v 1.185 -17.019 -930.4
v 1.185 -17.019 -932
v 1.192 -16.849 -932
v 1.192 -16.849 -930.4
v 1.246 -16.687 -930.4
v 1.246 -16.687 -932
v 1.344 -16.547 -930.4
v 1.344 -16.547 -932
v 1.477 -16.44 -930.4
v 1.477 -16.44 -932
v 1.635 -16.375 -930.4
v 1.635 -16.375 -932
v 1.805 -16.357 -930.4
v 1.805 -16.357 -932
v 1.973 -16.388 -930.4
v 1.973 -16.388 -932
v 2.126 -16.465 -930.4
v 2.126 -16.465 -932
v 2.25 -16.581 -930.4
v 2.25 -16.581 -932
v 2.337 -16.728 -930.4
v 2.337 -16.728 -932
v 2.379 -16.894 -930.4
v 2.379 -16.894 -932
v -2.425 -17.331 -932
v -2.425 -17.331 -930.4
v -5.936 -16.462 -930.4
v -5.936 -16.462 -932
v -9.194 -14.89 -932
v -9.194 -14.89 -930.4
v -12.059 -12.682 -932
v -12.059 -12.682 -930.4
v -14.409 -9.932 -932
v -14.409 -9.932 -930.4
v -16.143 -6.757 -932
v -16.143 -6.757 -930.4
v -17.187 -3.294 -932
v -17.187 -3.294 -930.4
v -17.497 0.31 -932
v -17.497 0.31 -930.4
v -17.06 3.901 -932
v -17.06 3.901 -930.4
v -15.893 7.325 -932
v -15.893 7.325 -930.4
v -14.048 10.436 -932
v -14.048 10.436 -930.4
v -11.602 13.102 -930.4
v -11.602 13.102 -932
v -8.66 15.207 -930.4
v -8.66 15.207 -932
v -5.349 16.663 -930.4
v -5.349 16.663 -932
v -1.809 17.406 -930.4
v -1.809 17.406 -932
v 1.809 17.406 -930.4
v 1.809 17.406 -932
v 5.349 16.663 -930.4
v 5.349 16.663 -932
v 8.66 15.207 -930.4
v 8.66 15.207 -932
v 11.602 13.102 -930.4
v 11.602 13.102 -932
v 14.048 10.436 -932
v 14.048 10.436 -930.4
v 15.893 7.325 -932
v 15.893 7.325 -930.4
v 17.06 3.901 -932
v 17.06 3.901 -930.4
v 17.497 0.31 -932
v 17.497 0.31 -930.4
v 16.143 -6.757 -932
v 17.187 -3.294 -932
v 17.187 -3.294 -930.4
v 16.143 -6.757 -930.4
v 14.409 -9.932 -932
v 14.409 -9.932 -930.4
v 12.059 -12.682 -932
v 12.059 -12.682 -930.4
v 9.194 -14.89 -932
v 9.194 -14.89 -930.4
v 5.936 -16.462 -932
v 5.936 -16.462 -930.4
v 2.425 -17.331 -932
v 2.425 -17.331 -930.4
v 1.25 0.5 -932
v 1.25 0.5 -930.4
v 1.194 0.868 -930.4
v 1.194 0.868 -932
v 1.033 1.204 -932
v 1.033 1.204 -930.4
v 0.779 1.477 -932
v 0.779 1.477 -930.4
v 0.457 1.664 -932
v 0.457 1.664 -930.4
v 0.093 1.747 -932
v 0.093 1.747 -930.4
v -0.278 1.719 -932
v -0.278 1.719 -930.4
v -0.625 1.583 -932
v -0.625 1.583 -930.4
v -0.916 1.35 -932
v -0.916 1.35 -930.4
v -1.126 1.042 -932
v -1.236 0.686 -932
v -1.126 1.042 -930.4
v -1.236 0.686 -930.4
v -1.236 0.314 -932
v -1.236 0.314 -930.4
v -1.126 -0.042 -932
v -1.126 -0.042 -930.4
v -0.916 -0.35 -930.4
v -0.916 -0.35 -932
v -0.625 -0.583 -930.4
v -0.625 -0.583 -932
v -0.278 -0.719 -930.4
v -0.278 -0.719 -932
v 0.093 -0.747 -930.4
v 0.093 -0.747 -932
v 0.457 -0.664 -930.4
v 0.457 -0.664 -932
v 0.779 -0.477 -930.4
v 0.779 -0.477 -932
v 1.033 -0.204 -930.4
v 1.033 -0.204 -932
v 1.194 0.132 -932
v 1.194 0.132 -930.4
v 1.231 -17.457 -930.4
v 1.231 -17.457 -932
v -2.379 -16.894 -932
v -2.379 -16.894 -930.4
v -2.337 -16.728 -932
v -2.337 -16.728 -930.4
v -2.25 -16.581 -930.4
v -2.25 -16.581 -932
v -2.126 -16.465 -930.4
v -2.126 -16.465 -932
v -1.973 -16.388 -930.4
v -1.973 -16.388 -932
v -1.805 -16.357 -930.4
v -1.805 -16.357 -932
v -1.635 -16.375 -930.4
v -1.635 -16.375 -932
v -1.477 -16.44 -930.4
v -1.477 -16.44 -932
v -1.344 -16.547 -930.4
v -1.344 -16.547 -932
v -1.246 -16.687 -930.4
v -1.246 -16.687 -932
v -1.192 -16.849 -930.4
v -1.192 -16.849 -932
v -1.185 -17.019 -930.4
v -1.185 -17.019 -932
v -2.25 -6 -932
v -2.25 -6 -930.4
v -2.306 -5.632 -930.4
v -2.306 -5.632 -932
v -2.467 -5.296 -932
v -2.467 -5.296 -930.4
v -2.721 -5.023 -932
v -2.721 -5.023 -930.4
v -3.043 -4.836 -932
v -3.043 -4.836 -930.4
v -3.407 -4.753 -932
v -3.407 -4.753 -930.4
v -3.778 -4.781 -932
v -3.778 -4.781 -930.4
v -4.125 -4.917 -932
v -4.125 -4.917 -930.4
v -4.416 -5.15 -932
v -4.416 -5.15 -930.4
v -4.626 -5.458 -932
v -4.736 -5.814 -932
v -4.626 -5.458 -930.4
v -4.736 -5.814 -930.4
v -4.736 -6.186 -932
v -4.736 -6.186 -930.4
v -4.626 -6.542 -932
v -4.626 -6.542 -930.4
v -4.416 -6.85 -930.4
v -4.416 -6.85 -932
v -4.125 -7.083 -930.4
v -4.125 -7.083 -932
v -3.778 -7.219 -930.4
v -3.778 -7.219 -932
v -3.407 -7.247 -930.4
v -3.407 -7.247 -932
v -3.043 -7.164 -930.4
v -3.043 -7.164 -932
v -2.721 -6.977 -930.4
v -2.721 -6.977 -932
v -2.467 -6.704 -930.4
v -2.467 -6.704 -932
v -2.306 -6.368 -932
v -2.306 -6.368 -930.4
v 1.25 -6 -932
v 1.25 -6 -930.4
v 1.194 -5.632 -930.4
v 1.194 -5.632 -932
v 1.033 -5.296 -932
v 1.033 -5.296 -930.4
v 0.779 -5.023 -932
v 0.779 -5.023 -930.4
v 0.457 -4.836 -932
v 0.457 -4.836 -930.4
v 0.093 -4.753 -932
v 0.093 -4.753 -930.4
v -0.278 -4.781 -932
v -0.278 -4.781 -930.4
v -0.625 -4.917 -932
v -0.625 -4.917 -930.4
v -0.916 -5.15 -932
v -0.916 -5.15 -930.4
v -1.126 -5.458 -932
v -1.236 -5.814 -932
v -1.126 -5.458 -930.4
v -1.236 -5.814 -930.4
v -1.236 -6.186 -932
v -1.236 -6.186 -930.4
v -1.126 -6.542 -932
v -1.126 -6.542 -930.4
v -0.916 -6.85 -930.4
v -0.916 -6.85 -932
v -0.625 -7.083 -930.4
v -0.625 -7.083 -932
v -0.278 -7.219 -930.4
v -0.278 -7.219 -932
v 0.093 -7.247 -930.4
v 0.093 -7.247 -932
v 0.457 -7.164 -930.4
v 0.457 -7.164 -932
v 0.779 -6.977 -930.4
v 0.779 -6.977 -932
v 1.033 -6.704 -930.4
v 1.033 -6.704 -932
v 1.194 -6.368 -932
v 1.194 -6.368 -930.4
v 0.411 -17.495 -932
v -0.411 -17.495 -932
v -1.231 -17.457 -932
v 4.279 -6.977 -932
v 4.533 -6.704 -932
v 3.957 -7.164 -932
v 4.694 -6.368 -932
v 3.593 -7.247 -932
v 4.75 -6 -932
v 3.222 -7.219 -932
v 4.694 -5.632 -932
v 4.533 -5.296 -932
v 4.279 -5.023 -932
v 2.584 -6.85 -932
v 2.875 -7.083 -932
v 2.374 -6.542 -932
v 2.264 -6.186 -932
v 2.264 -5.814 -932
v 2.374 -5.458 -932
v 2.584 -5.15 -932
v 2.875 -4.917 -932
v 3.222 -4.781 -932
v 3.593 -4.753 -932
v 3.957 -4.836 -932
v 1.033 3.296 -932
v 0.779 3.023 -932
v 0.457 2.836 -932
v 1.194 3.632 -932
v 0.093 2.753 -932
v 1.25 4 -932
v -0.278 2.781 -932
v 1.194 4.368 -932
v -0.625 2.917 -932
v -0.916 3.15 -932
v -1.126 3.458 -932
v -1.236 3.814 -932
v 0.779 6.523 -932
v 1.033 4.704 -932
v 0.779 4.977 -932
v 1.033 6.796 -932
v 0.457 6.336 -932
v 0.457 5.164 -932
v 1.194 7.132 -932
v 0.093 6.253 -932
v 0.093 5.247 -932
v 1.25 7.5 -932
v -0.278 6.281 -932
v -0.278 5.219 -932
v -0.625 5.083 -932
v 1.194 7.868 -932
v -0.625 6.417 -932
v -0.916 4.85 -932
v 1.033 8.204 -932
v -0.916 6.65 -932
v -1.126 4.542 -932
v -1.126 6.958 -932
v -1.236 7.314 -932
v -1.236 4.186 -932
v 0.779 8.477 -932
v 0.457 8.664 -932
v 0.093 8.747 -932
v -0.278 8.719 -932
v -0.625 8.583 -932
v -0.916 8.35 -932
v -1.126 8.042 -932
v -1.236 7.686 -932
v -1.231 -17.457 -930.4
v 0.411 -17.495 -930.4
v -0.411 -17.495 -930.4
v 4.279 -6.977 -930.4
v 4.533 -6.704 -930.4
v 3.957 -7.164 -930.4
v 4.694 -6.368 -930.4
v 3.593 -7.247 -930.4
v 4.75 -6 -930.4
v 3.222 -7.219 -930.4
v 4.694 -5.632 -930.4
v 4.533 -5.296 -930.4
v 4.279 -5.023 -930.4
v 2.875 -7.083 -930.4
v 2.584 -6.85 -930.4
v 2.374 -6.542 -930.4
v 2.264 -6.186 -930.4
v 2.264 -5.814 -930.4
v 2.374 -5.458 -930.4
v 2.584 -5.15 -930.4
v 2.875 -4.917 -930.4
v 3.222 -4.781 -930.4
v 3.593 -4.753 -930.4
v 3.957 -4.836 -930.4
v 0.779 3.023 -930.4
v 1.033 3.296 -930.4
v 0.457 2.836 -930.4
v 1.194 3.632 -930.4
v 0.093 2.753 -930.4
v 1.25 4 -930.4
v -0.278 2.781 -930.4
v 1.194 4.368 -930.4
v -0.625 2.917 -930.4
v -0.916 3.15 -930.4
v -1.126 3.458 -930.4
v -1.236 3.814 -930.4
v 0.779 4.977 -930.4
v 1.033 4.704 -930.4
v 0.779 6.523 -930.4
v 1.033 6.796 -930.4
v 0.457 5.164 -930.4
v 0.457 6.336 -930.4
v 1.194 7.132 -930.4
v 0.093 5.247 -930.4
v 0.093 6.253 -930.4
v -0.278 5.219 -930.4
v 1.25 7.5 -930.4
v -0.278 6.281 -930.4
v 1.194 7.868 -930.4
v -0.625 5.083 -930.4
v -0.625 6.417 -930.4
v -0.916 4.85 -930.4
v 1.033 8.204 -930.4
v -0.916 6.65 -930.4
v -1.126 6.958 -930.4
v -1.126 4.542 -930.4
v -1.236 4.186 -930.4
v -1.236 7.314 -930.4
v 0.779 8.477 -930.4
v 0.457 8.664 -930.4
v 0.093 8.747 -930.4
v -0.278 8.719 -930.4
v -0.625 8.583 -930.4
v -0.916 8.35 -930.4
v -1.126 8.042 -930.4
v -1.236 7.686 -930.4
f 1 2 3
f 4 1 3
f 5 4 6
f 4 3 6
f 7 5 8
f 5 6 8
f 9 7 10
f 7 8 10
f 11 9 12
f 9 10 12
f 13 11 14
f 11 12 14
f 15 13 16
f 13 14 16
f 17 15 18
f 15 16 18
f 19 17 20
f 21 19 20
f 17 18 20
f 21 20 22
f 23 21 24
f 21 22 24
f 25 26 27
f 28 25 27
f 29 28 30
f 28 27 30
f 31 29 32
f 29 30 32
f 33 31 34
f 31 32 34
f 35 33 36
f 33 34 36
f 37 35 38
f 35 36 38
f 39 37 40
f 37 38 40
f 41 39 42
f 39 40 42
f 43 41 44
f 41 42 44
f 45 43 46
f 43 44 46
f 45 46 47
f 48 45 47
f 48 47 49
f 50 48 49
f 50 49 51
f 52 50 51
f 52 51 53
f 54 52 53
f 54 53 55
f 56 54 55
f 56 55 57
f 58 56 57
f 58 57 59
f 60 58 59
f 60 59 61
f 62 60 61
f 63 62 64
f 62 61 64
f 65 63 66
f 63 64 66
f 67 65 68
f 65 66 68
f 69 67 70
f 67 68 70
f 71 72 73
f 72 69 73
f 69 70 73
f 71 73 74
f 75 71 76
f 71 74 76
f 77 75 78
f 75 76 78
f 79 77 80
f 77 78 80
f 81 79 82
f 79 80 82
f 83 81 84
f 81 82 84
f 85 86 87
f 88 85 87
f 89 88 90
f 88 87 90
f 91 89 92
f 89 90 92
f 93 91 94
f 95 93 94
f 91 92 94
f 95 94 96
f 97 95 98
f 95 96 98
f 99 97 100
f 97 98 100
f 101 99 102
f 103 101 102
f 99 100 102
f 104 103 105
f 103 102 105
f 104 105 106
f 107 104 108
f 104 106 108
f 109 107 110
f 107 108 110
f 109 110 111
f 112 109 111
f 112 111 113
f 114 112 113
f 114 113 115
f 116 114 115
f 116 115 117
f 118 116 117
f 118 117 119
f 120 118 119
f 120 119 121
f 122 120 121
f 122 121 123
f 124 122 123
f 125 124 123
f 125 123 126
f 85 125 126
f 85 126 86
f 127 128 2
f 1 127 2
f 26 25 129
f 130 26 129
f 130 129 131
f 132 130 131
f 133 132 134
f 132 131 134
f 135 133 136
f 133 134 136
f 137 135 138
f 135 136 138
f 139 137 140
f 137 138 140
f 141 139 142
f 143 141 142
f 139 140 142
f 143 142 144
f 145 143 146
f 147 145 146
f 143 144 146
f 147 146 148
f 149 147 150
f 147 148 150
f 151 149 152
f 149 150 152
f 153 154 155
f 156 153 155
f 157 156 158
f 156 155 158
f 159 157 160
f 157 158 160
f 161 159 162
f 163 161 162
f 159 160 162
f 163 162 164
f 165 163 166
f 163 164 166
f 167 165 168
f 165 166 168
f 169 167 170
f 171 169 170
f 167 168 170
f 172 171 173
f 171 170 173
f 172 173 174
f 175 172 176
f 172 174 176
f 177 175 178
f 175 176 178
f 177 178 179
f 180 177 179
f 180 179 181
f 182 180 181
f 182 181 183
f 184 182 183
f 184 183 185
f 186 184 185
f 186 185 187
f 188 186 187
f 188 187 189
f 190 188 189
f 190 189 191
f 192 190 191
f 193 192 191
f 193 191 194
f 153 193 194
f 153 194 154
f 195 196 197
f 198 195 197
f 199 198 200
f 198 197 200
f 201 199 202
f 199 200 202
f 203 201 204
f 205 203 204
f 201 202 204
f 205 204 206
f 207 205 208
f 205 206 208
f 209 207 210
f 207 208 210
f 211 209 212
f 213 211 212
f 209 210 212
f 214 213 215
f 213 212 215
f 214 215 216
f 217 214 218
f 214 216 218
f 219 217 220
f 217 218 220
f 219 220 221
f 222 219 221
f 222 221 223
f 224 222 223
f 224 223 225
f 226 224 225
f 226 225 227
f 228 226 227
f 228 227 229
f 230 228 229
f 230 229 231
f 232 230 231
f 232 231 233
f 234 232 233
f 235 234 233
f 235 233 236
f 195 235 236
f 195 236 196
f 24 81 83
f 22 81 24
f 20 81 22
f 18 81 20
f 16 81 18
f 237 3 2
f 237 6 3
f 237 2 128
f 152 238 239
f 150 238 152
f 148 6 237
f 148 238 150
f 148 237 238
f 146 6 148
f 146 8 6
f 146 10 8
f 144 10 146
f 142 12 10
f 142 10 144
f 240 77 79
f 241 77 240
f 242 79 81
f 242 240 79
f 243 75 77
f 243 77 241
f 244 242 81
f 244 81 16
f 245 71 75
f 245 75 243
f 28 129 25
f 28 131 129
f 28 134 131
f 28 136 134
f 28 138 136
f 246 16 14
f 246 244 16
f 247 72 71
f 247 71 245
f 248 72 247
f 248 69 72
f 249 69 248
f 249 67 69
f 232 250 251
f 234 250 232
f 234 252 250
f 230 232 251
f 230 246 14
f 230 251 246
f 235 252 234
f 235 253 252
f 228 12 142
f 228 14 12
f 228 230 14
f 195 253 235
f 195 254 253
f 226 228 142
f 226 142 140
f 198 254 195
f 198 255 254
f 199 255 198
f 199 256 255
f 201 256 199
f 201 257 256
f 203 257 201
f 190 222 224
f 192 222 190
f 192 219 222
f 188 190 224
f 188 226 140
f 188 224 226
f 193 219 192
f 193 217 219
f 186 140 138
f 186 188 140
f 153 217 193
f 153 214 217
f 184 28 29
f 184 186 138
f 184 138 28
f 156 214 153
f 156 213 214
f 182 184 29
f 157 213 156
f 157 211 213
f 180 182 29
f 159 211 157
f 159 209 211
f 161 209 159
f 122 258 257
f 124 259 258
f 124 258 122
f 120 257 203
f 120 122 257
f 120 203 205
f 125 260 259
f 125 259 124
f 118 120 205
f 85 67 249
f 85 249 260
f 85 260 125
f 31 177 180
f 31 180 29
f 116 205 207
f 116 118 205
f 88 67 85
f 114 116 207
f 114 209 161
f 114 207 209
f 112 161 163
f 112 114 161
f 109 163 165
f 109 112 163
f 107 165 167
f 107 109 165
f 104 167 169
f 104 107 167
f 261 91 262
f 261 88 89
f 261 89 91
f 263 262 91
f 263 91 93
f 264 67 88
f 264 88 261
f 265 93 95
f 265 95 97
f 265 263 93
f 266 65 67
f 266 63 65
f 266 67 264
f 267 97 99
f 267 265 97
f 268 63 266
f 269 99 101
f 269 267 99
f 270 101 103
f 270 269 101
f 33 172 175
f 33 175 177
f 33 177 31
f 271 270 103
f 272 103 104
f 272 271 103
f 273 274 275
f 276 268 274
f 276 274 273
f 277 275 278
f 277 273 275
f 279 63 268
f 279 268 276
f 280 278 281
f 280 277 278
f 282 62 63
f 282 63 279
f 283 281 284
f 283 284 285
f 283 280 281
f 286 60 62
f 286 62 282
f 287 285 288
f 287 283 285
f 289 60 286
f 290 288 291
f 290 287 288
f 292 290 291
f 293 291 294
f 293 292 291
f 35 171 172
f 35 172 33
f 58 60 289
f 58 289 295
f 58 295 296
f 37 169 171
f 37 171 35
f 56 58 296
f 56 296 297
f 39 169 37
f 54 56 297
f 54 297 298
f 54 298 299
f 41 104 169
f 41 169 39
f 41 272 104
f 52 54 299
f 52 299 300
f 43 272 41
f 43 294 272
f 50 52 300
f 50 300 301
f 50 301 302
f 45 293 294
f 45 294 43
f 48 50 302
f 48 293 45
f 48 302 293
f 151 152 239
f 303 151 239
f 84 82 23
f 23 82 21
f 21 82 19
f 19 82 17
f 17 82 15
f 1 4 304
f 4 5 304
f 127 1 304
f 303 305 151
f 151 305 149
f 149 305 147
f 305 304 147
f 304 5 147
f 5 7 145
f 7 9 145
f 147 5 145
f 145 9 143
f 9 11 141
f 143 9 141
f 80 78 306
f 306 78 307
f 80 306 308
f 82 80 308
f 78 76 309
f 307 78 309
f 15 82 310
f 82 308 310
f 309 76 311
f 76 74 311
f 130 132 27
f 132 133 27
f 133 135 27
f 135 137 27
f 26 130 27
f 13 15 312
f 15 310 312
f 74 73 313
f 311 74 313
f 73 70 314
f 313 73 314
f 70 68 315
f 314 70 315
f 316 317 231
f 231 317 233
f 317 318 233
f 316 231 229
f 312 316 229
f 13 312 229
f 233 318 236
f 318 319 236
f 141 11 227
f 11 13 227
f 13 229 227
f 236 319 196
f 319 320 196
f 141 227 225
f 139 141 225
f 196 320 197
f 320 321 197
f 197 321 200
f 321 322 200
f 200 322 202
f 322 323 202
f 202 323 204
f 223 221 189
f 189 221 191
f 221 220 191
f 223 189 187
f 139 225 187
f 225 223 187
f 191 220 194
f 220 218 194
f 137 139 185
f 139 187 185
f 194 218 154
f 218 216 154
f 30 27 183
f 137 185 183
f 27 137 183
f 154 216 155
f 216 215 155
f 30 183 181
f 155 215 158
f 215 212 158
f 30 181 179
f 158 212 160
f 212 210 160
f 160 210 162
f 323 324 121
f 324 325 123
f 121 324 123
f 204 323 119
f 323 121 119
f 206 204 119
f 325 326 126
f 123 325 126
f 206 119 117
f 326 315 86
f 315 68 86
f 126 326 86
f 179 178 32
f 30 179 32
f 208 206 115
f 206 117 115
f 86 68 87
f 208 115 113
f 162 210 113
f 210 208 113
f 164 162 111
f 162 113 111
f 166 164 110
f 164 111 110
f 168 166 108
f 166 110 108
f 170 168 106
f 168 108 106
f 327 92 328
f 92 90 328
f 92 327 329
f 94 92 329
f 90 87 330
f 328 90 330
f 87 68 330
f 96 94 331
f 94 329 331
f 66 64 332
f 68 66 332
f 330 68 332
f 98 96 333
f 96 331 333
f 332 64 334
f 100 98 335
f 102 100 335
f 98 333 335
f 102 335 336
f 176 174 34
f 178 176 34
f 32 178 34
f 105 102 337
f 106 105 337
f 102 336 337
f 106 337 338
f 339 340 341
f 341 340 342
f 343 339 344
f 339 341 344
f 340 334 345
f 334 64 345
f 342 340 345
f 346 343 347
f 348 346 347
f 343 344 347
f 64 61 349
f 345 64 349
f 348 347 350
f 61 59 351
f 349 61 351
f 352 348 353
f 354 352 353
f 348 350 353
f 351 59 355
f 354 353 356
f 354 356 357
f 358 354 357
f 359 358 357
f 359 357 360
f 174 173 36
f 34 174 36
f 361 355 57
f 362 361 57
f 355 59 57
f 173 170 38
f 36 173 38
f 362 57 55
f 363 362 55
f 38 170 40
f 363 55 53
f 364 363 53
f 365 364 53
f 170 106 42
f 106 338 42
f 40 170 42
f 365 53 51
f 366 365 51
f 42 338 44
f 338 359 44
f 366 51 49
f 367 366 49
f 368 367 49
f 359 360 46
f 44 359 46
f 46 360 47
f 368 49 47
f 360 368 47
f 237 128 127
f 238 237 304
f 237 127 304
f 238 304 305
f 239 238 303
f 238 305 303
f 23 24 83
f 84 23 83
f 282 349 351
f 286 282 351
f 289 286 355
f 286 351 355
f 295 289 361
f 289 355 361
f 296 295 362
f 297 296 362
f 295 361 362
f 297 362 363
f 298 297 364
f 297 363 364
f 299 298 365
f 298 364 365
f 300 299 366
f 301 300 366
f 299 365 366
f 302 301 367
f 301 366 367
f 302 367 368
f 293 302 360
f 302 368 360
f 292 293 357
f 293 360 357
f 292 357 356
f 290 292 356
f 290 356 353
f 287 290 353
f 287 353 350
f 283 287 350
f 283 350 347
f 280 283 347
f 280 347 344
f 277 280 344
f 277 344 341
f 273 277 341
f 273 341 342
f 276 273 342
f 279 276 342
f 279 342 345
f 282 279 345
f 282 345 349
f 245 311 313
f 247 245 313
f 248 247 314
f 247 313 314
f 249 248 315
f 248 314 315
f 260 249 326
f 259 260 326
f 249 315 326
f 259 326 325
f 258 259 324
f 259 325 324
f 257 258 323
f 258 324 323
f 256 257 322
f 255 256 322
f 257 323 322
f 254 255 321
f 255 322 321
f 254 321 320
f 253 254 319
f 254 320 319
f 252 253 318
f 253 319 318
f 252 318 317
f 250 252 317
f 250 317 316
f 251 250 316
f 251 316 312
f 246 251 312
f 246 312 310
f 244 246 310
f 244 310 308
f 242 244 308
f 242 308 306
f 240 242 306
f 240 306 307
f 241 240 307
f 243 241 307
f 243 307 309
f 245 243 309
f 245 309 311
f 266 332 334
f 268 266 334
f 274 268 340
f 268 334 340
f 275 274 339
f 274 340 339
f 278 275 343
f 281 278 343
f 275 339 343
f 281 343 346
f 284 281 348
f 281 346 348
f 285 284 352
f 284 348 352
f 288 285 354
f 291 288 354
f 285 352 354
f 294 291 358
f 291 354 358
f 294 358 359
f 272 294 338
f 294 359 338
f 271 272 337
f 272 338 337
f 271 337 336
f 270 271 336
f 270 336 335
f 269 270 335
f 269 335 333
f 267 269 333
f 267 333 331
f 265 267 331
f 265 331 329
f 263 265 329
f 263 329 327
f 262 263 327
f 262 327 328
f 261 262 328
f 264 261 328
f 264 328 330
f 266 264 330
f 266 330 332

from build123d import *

# Parameters (mm, degrees)
SKETCH1_R           = 17.5
BOSS_EXTRUDE1_DEPTH = 1.6
CUT_EXTRUDE1_DEPTH  = 25.800403223
SKETCH4_R           = 1.25
CUT_EXTRUDE2_DEPTH  = 25.800403223


with BuildPart() as part:
    # Sketch1 → Boss-Extrude1 (new body)
    with BuildSketch(Plane(origin=(0, 0, -930.4), x_dir=(-1, 0, 0), z_dir=(0, 0, -1))):
        Circle(SKETCH1_R)
    extrude(amount=BOSS_EXTRUDE1_DEPTH)

    # Sketch2 → Cut-Extrude1 (cut, through all)
    with BuildSketch(Plane(origin=(0, 0, -932), x_dir=(-1, 0, 0), z_dir=(0, 0, -1))):
        with BuildLine():
            Line((-2.378923436, -16.893881238), (-2.424885778, -17.331183715))
            ThreePointArc((-2.424885778, -17.331183715), (-1.829248107, -17.404133169), (-1.231459504, -17.456617871))
            Line((-1.231459504, -17.456617871), (-1.185497161, -17.019315394))
            ThreePointArc((-1.185497161, -17.019315394), (-1.719493221, -16.359885179), (-2.378923436, -16.893881238))
        make_face()
        with BuildLine():
            ThreePointArc((1.231459504, -17.456617871), (1.829248107, -17.404133169), (2.424885778, -17.331183715))
            Line((2.424885778, -17.331183715), (2.378923436, -16.893881238))
            ThreePointArc((2.378923436, -16.893881238), (1.719493221, -16.359885179), (1.185497161, -17.019315394))
            Line((1.185497161, -17.019315394), (1.231459504, -17.456617871))
        make_face()
    extrude(amount=-CUT_EXTRUDE1_DEPTH, mode=Mode.SUBTRACT)

    # Sketch4 → Cut-Extrude2 (cut, through all)
    with BuildSketch(Plane.XY.offset(-930.4)):
        with Locations((0, 7.5)):
            Circle(SKETCH4_R)
        with Locations((0, 4)):
            Circle(SKETCH4_R)
        with Locations((0, 0.5)):
            Circle(SKETCH4_R)
        with Locations((-3.5, -6)):
            Circle(SKETCH4_R)
        with Locations((0, -6)):
            Circle(SKETCH4_R)
        with Locations((3.5, -6)):
            Circle(SKETCH4_R)
    extrude(amount=-CUT_EXTRUDE2_DEPTH, mode=Mode.SUBTRACT)


solid = part.part
